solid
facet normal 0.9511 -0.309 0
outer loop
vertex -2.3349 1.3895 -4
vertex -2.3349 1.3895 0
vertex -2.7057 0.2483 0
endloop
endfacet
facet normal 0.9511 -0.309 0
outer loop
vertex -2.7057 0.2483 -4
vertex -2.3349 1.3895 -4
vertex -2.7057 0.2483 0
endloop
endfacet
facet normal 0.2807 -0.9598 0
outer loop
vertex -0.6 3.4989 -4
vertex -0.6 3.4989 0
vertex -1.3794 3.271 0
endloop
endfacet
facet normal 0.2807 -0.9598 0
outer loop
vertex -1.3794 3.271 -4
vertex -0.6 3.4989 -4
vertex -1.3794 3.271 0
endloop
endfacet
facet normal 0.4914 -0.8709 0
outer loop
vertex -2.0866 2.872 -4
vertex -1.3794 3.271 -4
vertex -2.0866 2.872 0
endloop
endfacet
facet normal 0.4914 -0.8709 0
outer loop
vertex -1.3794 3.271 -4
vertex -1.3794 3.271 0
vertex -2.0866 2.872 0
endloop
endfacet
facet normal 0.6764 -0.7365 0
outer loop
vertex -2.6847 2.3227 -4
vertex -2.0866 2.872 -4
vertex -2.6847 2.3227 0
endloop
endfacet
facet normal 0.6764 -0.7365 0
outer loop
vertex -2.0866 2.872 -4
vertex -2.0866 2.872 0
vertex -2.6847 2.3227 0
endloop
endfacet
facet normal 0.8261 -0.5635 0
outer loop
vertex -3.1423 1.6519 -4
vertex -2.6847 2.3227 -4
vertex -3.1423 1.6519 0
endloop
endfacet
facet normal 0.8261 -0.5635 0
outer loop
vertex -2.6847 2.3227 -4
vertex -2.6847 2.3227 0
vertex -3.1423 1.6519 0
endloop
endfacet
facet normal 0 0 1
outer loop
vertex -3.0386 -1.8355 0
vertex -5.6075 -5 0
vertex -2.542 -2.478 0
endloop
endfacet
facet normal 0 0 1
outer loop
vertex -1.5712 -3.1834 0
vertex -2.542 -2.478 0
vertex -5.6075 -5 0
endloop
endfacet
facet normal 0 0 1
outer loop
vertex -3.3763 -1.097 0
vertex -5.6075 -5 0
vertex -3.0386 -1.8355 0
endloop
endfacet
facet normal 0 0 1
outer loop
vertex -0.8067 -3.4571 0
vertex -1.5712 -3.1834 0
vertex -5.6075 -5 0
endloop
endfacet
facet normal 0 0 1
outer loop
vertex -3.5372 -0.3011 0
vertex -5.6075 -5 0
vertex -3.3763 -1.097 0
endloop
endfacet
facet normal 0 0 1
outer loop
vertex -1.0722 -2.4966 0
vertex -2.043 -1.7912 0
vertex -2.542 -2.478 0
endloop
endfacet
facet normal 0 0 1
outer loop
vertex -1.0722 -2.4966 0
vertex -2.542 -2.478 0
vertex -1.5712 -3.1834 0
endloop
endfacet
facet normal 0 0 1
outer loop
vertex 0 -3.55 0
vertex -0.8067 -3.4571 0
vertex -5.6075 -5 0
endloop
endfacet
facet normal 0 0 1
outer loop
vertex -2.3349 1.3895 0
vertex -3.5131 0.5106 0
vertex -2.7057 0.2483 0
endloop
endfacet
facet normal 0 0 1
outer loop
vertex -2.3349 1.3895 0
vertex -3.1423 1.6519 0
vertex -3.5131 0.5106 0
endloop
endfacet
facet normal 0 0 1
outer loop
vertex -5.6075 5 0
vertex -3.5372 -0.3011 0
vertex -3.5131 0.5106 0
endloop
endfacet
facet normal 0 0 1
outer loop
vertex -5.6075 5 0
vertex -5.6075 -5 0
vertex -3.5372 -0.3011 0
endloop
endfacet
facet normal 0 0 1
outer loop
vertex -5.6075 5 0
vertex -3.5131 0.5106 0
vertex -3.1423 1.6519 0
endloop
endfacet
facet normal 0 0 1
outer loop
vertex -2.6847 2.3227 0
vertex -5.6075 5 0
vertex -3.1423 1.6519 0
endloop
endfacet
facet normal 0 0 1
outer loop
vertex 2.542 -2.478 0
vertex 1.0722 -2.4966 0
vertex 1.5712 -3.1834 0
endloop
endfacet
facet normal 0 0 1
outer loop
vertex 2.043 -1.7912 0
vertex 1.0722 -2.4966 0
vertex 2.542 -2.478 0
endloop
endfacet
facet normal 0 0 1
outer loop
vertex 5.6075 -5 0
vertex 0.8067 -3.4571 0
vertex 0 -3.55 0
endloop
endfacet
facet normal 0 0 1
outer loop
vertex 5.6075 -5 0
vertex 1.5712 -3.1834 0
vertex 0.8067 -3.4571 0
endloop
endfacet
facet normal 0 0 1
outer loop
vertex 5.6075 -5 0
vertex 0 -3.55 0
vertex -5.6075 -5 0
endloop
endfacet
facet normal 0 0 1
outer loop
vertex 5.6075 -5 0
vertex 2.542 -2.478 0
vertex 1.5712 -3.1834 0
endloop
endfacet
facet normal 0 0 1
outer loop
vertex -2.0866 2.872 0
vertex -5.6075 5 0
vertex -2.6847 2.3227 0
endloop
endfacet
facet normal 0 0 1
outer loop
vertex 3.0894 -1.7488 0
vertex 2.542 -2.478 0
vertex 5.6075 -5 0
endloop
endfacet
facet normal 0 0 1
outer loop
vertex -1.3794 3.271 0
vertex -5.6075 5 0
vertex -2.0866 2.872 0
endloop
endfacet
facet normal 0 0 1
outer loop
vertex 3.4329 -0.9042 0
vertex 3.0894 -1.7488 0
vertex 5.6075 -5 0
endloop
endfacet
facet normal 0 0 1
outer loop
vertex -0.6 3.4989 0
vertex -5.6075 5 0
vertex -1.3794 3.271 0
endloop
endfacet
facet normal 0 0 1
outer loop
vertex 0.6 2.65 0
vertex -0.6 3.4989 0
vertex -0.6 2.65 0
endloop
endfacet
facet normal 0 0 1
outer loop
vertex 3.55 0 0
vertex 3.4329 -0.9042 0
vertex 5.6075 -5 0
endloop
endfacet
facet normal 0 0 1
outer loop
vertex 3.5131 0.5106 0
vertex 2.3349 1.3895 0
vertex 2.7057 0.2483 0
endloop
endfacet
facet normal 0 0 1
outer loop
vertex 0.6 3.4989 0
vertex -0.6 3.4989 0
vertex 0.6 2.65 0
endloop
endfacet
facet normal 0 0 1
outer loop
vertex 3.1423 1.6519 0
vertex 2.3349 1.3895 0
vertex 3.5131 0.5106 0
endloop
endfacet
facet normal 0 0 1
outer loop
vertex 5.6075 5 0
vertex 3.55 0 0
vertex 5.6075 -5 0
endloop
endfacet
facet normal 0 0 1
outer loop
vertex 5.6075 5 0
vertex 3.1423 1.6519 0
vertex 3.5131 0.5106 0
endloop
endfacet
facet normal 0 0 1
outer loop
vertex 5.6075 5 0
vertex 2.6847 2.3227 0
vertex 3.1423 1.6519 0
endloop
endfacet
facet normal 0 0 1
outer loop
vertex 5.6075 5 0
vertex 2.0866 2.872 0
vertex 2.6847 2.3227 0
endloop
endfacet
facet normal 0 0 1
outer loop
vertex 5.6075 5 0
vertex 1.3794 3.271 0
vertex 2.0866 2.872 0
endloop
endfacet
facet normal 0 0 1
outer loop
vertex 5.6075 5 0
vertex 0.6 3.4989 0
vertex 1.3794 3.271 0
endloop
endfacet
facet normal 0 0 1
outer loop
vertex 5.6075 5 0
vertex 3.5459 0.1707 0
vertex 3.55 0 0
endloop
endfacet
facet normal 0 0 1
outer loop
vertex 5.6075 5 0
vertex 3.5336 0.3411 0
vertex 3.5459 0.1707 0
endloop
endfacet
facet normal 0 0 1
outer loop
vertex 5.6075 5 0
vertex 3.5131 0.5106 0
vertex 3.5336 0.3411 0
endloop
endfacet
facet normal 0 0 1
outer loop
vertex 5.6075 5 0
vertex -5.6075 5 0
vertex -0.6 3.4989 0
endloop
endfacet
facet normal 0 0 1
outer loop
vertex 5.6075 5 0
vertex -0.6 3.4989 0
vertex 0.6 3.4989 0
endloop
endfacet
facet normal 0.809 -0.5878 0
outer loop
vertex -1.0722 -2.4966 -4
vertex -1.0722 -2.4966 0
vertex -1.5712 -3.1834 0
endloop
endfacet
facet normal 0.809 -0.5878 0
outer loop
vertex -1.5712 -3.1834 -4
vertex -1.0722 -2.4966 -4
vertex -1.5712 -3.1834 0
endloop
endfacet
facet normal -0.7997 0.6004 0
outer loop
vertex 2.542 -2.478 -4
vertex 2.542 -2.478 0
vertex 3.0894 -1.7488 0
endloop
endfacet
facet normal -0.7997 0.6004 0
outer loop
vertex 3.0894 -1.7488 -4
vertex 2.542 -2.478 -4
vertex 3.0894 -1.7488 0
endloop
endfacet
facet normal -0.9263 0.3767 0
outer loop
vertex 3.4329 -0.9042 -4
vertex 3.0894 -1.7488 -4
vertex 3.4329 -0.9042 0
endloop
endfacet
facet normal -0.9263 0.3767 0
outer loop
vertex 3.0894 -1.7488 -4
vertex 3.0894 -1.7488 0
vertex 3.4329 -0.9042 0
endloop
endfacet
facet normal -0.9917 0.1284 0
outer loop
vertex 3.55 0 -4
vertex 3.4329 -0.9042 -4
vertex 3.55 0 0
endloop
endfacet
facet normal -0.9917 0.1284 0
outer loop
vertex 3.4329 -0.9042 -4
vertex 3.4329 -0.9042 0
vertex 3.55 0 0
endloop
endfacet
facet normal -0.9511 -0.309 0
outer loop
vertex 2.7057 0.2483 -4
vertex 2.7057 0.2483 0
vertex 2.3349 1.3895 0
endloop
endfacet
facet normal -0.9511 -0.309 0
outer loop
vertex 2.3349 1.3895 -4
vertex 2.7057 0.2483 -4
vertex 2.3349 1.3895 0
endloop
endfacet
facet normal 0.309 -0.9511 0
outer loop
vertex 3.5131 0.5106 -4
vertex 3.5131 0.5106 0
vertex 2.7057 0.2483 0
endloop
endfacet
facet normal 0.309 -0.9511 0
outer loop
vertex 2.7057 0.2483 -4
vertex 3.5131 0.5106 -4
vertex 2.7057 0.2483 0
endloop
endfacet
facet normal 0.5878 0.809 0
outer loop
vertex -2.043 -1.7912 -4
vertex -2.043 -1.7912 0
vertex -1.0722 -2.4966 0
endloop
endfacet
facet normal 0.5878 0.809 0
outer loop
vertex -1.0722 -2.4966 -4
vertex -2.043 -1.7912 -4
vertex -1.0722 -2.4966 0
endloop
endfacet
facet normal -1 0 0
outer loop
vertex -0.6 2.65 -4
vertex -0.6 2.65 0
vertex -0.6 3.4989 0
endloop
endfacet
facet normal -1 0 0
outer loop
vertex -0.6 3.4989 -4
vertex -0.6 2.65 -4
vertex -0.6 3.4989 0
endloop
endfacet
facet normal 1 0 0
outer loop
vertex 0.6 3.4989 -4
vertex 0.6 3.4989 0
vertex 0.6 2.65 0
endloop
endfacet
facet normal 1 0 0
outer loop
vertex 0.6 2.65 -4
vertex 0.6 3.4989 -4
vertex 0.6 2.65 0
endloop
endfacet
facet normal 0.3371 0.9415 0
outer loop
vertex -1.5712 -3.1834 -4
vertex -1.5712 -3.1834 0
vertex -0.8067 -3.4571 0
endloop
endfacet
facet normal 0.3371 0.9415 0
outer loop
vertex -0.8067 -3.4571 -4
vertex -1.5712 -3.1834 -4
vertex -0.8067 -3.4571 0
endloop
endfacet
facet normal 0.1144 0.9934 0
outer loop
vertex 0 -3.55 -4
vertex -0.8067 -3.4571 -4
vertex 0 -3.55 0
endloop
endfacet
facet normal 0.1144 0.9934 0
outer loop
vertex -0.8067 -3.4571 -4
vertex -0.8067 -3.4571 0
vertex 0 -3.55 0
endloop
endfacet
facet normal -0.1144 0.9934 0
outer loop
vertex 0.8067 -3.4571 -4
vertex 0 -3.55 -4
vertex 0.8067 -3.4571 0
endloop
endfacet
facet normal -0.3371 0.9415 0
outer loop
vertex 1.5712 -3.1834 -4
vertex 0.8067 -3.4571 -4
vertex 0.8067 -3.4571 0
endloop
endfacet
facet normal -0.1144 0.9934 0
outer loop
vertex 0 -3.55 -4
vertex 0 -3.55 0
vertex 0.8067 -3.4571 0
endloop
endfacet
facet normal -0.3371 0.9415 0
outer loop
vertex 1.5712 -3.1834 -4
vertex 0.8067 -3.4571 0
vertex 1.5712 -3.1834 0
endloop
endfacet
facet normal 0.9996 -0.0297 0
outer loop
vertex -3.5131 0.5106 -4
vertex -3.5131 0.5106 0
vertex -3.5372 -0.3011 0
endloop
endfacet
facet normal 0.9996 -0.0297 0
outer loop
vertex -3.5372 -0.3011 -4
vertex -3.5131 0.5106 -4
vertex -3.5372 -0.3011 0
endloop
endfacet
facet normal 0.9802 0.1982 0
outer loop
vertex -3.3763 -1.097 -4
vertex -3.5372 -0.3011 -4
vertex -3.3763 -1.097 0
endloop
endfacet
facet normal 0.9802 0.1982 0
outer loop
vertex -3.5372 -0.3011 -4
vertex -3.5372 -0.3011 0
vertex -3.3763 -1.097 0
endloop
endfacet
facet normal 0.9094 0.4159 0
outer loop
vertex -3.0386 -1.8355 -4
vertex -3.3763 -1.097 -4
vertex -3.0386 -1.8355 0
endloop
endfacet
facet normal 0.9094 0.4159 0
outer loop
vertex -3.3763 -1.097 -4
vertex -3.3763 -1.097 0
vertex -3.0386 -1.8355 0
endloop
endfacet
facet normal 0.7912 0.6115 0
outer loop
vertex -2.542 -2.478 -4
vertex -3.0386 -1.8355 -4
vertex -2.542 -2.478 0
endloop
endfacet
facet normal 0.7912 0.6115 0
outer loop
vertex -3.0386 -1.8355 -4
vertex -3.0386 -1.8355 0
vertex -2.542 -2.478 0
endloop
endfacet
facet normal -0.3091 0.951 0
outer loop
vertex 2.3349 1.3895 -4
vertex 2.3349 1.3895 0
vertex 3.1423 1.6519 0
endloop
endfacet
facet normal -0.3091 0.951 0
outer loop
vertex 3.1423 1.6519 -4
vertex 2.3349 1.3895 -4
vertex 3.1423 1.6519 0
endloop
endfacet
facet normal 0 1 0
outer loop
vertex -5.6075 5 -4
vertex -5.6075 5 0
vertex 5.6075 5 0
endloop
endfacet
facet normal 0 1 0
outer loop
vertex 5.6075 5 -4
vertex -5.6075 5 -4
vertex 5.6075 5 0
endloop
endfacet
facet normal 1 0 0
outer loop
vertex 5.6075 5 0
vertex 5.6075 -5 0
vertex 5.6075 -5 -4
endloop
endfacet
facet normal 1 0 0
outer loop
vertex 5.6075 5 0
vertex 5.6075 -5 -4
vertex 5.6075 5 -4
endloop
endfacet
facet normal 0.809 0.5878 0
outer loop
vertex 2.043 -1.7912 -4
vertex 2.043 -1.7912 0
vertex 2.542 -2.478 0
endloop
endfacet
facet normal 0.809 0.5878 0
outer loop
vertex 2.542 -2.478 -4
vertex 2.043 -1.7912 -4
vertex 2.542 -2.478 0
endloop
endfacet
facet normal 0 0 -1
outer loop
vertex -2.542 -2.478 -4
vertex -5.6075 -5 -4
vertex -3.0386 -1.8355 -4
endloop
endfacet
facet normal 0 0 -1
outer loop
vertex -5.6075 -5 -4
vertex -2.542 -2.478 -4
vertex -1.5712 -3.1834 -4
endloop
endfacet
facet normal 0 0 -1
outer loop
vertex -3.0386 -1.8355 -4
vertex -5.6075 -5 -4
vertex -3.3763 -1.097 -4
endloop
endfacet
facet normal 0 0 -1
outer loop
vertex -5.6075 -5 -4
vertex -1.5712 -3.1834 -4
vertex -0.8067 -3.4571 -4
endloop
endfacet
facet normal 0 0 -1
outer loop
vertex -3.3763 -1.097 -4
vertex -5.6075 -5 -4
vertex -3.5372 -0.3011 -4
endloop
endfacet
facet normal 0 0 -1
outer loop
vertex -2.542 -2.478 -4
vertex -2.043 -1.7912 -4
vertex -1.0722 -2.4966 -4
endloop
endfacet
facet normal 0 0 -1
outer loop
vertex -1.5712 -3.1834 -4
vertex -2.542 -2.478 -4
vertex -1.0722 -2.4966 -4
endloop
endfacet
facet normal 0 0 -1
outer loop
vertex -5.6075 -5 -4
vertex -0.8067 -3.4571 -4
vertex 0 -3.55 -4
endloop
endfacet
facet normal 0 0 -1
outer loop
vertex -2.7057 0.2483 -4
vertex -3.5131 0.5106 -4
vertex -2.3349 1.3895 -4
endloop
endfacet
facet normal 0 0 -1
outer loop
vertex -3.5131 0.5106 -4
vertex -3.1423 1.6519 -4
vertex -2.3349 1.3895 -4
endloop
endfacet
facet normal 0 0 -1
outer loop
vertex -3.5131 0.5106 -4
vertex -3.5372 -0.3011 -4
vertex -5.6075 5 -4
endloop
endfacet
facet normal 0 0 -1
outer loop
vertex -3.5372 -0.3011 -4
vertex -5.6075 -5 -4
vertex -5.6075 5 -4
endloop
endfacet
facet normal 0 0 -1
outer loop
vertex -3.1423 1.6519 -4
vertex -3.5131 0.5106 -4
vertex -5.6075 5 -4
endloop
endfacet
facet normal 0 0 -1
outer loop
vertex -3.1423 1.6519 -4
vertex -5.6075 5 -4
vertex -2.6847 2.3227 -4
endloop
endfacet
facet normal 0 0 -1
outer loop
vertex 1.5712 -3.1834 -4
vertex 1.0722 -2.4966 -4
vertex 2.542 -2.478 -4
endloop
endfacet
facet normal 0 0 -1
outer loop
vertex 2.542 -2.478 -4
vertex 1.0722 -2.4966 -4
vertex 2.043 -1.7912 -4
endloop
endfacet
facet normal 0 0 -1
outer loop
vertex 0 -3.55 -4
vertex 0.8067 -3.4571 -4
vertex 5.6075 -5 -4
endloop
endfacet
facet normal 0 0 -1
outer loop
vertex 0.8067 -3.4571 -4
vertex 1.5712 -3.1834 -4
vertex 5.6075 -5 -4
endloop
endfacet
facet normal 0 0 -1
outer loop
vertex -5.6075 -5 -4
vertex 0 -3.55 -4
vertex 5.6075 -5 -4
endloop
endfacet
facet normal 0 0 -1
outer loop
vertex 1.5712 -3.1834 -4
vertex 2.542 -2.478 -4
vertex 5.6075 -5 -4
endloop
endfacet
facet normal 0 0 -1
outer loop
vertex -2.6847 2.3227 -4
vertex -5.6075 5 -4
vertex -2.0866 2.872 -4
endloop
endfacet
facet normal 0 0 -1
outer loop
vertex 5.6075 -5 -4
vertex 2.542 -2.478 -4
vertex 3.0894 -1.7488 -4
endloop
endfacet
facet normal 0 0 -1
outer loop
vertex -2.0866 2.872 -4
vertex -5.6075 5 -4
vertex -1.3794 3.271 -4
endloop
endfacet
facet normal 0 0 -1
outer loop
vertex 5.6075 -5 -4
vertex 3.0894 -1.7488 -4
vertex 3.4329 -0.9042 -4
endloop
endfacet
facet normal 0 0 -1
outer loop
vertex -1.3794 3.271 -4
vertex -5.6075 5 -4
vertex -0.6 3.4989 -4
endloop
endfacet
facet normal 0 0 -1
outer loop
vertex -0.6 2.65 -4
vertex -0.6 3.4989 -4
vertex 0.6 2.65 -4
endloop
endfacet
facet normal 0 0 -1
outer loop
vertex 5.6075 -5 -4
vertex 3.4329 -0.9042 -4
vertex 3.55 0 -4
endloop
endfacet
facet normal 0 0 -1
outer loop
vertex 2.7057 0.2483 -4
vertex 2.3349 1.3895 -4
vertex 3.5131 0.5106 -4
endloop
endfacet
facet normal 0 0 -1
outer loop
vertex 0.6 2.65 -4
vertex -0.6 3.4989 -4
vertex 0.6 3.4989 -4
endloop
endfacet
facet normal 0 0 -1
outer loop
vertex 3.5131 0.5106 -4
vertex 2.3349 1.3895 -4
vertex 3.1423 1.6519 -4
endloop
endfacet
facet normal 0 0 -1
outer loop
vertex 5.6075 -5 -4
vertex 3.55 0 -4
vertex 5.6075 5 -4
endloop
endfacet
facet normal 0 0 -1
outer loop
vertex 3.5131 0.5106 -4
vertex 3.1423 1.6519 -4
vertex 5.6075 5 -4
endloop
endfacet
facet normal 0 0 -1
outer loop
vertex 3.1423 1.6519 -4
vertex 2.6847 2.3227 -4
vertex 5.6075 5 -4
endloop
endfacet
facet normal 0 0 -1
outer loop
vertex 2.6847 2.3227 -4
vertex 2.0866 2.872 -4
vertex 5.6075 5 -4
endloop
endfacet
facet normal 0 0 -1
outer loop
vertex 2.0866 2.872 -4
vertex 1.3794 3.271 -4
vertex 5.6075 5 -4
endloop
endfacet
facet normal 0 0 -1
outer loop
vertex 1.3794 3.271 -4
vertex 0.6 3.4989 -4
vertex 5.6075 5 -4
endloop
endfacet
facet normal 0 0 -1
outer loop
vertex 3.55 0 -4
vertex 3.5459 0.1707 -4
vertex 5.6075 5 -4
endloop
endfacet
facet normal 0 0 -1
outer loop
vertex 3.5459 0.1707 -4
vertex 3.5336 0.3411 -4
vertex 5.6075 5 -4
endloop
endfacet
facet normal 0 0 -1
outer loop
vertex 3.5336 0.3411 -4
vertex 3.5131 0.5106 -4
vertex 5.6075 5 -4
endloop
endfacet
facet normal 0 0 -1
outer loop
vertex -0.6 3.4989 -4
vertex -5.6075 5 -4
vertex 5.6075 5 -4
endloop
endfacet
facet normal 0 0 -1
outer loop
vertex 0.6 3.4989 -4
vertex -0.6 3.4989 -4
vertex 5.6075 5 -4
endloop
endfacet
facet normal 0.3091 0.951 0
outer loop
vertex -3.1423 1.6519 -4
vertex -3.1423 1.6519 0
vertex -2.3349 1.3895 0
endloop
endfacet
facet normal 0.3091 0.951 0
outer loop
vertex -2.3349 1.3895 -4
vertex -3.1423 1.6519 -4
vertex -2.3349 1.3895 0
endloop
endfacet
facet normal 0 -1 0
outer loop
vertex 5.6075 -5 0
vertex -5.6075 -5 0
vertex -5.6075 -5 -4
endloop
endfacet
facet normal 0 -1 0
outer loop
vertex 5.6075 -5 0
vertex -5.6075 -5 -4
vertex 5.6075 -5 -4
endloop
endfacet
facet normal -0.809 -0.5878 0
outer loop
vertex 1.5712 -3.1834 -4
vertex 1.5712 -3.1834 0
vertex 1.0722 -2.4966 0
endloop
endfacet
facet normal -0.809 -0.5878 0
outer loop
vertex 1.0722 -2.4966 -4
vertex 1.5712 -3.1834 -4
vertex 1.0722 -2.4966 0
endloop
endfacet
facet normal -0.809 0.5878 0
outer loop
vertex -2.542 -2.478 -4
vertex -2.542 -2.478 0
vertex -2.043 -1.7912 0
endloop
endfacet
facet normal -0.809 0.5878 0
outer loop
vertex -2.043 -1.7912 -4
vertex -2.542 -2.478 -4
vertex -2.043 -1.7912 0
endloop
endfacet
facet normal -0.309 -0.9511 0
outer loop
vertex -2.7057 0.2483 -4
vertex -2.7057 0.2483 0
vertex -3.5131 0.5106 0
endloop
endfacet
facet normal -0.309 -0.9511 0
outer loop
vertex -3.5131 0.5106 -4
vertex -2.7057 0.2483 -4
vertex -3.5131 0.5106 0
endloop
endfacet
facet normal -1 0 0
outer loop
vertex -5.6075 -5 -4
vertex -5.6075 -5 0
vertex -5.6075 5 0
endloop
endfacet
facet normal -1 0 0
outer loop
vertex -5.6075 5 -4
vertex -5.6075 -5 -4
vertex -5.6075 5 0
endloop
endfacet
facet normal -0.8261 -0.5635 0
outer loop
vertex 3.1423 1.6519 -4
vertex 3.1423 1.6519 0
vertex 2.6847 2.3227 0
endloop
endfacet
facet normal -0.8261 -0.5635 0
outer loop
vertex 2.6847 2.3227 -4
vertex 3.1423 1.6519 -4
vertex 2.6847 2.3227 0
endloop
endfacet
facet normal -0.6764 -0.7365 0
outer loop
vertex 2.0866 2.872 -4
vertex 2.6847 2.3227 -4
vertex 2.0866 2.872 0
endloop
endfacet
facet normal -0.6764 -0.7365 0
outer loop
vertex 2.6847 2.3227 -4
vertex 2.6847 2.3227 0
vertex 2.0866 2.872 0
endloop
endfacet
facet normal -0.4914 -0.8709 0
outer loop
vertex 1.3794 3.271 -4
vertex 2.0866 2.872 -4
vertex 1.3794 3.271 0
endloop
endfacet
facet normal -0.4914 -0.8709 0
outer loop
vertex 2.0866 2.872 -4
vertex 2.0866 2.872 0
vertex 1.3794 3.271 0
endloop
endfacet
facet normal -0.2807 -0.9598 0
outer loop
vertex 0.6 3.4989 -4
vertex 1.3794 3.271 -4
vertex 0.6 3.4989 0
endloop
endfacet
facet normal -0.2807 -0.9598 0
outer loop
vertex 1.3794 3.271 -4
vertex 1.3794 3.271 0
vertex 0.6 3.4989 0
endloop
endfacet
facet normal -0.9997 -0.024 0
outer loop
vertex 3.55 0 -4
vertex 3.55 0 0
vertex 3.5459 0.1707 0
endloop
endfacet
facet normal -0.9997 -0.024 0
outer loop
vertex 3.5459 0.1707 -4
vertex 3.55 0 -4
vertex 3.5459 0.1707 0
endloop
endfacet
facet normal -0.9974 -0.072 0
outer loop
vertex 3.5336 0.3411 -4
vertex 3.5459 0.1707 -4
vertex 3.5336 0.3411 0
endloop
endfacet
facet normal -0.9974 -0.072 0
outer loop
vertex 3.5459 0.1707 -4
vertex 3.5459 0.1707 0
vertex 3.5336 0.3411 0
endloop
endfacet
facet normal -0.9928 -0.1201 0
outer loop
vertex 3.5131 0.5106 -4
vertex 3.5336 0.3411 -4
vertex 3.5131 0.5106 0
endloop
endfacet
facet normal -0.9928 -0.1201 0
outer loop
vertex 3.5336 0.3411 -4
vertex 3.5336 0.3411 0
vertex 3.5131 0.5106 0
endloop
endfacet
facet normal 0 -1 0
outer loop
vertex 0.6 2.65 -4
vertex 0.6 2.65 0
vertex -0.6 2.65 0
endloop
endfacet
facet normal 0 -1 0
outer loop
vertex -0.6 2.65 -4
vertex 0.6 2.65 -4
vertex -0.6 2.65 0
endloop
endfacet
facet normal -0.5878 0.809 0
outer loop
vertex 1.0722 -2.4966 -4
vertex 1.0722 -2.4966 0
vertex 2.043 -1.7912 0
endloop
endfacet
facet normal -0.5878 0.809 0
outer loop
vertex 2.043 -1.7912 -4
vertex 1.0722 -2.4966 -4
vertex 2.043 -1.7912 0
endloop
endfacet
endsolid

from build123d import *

# Parameters (mm, degrees)
F1_W     = 11.2149509114
F1_H     = 10
F2_DEPTH = 4
F4_DEPTH = 4


with BuildPart() as f2:
    # F1 (on Top) → F2 (new body)
    with BuildSketch(Plane.XY):
        Rectangle(F1_W, F1_H)
    extrude(amount=-F2_DEPTH)

    # F3 (on Top) → F4 (cut)
    with BuildSketch(Plane.XY):
        with BuildLine():
            ThreePointArc((2.5420287133, -2.4780213923), (3.2883660025, -1.3375907572), (3.55, 0))
            ThreePointArc((3.55, 0), (3.5407601901, 0.2559634273), (3.5130888585, 0.5105944302))
            Line((3.5130888585, 0.5105944302), (2.7057099648, 0.2482611253))
            Line((2.7057099648, 0.2482611253), (2.3348895716, 1.3895289449))
            Line((2.3348895716, 1.3895289449), (3.1422684653, 1.6518622498))
            ThreePointArc((3.1422684653, 1.6518622498), (2.0866376456, 2.87201033), (0.6, 3.4989284074))
            Line((0.6, 3.4989284074), (0.6, 2.65))
            Line((0.6, 2.65), (-0.6, 2.65))
            Line((-0.6, 2.65), (-0.6, 3.4989284074))
            ThreePointArc((-0.6, 3.4989284074), (-2.0866376456, 2.87201033), (-3.1422684653, 1.6518622498))
            Line((-3.1422684653, 1.6518622498), (-2.3348895716, 1.3895289449))
            Line((-2.3348895716, 1.3895289449), (-2.7057099648, 0.2482611253))
            Line((-2.7057099648, 0.2482611253), (-3.5130888585, 0.5105944302))
            ThreePointArc((-3.5130888585, 0.5105944302), (-3.3762506328, -1.09701033), (-2.5420287133, -2.4780213923))
            Line((-2.5420287133, -2.4780213923), (-2.0430411152, -1.7912238837))
            Line((-2.0430411152, -1.7912238837), (-1.072220722, -2.4965661865))
            Line((-1.072220722, -2.4965661865), (-1.5712083201, -3.1833636951))
            ThreePointArc((-1.5712083201, -3.1833636951), (0, -3.55), (1.5712083201, -3.1833636951))
            Line((1.5712083201, -3.1833636951), (1.072220722, -2.4965661865))
            Line((1.072220722, -2.4965661865), (2.0430411152, -1.7912238837))
            Line((2.0430411152, -1.7912238837), (2.5420287133, -2.4780213923))
        make_face()
    extrude(amount=-F4_DEPTH, mode=Mode.SUBTRACT)


solid = f2.part
